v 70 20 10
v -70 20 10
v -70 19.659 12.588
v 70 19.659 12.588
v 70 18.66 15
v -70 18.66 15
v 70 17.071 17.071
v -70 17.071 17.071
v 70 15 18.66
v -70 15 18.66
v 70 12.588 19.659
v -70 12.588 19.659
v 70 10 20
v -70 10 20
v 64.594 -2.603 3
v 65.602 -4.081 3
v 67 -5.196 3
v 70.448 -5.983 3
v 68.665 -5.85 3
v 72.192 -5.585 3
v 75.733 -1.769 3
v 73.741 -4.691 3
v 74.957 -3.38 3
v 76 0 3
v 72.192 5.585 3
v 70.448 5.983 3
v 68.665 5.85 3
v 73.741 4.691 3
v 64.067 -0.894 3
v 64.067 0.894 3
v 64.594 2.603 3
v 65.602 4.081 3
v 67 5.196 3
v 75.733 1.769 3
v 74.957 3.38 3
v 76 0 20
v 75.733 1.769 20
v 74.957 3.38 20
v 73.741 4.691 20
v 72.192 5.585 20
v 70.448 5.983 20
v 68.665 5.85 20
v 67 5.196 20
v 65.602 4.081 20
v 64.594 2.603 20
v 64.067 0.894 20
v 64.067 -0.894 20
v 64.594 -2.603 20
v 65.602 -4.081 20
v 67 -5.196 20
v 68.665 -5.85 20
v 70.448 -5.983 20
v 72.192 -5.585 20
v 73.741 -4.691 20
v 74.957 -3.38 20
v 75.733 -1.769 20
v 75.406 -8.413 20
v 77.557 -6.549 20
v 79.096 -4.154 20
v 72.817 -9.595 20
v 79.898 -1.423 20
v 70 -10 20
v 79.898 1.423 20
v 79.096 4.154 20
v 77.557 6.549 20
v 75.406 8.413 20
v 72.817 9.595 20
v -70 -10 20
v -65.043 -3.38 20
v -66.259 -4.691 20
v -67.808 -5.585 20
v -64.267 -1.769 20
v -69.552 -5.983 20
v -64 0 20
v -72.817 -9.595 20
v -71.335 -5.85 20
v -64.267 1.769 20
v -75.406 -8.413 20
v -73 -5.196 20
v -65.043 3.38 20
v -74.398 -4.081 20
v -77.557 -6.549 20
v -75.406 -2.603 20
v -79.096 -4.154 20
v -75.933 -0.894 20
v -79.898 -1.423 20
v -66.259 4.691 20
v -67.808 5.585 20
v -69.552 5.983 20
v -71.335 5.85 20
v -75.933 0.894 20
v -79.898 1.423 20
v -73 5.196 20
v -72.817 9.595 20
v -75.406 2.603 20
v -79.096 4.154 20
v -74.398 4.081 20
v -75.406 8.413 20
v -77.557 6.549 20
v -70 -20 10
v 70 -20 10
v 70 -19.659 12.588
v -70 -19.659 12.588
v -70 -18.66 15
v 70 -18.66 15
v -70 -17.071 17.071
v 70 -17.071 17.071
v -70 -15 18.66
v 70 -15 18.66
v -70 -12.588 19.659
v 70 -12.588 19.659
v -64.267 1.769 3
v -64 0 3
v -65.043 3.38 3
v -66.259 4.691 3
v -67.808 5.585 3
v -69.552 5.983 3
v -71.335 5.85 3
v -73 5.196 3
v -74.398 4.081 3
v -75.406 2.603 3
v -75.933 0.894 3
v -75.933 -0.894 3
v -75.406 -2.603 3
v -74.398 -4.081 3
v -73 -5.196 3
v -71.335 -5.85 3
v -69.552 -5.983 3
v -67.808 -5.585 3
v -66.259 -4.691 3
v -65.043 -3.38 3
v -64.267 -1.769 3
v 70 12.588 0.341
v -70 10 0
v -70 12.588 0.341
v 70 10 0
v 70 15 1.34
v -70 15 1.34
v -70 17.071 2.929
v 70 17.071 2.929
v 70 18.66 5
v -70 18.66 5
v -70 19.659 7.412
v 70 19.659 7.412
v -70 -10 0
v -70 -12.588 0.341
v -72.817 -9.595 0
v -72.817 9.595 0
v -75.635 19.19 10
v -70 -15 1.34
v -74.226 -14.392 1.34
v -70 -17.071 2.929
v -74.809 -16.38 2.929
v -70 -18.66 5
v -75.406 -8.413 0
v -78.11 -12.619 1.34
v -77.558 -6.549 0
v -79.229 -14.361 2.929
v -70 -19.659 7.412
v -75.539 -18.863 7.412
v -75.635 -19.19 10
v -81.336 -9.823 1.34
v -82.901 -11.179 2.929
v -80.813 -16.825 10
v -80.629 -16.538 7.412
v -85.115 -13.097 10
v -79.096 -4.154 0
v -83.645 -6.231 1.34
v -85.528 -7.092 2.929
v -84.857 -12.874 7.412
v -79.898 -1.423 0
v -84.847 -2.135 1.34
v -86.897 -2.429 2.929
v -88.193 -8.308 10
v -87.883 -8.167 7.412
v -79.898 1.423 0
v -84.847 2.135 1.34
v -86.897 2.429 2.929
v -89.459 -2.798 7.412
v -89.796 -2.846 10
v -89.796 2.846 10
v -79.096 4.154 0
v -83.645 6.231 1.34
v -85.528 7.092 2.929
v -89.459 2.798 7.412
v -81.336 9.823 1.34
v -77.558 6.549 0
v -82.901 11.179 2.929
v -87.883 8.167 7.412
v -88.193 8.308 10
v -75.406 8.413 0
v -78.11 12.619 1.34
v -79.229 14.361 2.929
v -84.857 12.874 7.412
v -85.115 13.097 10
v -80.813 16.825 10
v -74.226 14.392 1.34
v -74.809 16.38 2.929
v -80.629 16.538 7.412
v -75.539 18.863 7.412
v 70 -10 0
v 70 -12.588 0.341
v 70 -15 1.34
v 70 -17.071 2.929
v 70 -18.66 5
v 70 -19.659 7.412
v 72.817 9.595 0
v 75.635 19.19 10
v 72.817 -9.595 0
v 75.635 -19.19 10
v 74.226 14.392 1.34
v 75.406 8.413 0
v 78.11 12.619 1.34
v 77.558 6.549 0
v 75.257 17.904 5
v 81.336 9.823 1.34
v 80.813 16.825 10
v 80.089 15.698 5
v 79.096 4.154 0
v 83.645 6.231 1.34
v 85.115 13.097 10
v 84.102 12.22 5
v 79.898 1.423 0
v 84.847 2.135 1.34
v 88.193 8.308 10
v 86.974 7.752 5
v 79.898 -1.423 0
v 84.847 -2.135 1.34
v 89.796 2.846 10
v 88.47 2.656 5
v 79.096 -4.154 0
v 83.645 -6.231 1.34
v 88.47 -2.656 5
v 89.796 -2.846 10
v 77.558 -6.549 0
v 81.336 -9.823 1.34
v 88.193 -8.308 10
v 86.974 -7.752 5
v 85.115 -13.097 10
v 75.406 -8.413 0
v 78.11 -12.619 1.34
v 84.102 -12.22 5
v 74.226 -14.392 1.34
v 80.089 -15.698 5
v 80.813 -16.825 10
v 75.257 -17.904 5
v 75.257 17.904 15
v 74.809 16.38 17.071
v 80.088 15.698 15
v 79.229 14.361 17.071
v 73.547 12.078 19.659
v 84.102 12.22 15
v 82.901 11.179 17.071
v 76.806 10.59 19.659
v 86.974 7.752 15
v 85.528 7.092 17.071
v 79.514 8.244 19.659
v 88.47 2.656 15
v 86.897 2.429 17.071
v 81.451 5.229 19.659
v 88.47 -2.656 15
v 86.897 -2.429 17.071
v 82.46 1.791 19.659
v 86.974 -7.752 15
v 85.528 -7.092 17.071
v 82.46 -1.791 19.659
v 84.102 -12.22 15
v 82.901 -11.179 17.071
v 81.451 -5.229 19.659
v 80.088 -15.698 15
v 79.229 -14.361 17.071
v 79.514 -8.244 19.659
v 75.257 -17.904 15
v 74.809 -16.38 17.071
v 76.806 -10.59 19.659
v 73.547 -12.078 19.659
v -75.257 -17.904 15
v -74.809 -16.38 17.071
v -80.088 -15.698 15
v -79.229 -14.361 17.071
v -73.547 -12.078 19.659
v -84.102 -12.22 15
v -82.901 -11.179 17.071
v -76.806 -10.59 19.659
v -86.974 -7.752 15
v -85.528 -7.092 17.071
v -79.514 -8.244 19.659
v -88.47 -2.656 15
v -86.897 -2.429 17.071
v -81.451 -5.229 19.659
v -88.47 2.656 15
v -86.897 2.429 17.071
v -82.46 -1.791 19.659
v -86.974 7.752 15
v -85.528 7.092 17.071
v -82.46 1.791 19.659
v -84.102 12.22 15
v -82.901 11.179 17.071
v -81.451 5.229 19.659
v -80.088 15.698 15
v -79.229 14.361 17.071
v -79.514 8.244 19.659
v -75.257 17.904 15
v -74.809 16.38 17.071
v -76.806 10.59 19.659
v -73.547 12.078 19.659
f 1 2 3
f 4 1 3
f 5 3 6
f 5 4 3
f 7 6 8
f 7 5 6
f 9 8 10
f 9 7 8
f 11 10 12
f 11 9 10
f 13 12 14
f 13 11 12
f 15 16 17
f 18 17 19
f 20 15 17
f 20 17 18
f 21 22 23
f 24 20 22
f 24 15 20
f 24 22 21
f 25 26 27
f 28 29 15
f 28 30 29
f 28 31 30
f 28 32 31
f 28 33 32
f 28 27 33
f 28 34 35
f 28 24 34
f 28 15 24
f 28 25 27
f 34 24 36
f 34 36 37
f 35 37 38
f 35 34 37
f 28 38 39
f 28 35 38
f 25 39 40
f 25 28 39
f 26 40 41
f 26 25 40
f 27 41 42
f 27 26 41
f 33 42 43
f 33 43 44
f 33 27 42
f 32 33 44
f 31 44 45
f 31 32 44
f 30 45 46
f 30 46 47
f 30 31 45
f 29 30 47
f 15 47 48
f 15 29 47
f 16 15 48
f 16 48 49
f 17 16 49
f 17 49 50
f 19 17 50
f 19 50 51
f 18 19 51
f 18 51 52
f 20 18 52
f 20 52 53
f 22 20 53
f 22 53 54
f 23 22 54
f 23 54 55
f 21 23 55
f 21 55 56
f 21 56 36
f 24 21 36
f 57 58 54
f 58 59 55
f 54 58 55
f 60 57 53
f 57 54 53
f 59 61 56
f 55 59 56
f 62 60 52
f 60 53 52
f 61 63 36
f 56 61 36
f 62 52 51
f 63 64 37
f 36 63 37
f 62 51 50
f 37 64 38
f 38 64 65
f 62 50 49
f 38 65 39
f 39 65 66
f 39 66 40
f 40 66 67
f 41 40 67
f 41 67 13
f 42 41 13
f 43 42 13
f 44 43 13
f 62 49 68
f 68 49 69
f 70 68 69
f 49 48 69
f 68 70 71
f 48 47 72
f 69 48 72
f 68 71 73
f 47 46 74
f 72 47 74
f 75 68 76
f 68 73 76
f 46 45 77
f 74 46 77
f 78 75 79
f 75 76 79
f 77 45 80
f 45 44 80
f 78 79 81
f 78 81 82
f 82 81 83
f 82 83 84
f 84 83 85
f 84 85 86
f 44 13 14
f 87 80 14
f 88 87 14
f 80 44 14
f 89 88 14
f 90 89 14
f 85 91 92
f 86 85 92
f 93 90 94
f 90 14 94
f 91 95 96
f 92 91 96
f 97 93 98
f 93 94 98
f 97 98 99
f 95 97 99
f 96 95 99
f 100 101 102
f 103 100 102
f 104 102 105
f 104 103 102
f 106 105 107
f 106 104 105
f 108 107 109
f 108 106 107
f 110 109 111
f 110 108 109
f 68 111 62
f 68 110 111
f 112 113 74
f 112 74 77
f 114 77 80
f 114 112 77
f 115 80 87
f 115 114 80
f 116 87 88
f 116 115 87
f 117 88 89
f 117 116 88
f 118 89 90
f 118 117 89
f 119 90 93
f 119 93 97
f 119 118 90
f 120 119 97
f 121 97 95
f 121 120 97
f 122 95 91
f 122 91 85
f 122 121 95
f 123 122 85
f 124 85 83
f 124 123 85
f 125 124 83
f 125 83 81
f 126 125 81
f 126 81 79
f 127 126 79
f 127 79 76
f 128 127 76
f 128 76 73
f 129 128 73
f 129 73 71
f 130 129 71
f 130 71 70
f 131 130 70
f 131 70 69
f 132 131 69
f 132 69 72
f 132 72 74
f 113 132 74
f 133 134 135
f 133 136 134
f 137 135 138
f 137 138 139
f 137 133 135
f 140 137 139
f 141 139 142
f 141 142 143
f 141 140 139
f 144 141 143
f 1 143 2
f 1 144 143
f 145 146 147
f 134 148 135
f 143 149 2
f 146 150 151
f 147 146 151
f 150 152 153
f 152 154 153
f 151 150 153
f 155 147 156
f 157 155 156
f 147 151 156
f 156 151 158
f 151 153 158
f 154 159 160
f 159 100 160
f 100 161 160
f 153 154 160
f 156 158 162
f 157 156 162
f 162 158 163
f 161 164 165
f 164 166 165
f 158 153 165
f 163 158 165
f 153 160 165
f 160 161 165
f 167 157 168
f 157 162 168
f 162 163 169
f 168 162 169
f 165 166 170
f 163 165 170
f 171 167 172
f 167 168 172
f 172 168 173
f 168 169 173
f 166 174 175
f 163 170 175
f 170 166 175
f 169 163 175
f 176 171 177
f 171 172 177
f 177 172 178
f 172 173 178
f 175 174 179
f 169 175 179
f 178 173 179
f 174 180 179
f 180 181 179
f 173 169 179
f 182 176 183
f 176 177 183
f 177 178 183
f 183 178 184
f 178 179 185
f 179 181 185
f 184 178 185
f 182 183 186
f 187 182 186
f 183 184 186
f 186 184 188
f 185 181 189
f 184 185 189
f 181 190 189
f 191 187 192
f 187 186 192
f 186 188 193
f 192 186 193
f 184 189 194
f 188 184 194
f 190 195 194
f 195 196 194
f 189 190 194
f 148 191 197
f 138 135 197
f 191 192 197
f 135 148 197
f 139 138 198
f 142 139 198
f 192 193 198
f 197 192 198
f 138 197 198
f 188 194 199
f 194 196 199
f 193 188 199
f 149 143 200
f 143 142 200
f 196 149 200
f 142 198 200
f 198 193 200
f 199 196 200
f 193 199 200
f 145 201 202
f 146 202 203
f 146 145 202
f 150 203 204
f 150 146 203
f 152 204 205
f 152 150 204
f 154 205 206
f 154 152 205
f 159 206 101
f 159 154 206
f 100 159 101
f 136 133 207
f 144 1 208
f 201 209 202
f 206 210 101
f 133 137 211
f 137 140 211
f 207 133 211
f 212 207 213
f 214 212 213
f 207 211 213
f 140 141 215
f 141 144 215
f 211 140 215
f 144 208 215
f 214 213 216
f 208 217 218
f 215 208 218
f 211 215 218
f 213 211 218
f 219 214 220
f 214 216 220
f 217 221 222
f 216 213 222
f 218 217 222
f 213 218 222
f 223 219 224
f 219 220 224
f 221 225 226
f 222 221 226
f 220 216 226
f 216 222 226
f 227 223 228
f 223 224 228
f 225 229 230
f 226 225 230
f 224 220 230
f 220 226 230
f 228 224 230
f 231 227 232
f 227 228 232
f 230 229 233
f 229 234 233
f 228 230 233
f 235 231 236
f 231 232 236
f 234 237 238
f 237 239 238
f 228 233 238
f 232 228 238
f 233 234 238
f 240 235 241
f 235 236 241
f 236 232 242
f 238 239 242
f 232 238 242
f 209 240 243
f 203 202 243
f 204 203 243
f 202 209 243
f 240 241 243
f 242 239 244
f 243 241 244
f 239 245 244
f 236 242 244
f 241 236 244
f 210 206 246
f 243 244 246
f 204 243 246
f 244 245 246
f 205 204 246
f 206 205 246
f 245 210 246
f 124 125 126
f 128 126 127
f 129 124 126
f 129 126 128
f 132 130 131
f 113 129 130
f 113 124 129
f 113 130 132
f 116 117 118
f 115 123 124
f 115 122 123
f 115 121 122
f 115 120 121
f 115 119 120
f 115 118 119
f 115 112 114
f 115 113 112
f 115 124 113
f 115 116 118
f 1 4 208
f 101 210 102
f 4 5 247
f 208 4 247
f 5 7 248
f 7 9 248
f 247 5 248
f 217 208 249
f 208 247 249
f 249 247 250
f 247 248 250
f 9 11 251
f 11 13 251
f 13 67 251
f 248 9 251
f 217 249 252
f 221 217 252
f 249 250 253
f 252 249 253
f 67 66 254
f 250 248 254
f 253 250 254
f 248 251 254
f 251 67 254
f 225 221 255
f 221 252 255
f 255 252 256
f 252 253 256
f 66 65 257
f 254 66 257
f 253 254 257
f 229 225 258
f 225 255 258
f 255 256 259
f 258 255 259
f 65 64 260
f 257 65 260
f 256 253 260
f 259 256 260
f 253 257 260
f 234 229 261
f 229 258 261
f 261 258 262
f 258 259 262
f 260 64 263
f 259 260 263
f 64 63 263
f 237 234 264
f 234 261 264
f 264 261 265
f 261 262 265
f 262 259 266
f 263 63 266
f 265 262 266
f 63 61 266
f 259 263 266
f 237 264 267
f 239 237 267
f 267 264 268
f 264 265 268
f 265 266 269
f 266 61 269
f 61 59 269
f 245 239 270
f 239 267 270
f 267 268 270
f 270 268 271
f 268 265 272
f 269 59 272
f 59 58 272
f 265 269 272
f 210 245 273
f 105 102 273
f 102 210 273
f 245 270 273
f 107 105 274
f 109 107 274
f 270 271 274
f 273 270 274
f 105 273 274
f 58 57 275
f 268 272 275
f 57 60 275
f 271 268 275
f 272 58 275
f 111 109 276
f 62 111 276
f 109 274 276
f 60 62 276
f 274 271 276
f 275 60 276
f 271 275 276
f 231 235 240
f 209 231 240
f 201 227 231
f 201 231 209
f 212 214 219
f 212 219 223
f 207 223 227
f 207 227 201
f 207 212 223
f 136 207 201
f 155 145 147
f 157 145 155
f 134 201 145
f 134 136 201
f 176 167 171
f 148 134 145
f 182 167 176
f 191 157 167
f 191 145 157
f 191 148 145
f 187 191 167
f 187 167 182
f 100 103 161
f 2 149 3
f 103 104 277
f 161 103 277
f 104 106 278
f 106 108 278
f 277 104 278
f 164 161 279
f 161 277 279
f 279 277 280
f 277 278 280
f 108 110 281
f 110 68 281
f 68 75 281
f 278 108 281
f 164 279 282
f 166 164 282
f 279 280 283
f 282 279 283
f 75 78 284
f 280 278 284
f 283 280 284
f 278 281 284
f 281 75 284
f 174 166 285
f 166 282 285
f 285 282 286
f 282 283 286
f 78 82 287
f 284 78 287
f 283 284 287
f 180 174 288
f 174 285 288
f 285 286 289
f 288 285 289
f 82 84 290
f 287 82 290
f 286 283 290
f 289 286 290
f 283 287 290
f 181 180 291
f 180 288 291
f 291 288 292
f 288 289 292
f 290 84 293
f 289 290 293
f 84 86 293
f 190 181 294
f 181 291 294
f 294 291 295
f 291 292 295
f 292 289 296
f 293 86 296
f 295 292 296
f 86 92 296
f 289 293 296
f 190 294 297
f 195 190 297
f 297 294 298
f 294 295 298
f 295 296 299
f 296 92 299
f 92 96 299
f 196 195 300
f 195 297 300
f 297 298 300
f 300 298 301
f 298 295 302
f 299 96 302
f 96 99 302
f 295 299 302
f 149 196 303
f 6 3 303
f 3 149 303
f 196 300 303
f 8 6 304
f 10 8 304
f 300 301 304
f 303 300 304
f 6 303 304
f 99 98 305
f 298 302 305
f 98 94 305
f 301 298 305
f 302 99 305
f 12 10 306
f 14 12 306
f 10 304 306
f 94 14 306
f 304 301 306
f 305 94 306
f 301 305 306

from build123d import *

# Parameters (mm, degrees)
SKETCH1_R           = 6
BOSS_EXTRUDE2_DEPTH = 20
SKETCH3_R           = 10
BOSS_EXTRUDE3_DEPTH = 3
FILLET1_R           = 10
FILLET2_R           = 10


with BuildPart() as part:
    # Sketch1 → Boss-Extrude2 (new body)
    with BuildSketch(Plane.XY):
        with BuildLine():
            Line((-70, 20), (70, 20))
            ThreePointArc((70, 20), (90, 0), (70, -20))
            Line((70, -20), (-70, -20))
            ThreePointArc((-70, -20), (-90, 0), (-70, 20))
        make_face()
        with Locations((-70, 0)):
            Circle(SKETCH1_R, mode=Mode.SUBTRACT)
        with Locations((70, 0)):
            Circle(SKETCH1_R, mode=Mode.SUBTRACT)
    extrude(amount=BOSS_EXTRUDE2_DEPTH)

    # Sketch3 → Boss-Extrude3 (add)
    with BuildSketch(Plane.XY):
        with Locations((-70, 0)):
            Circle(SKETCH3_R)
        with Locations((70, 0)):
            Circle(SKETCH3_R)
    extrude(amount=BOSS_EXTRUDE3_DEPTH)

    # Fillet1
    fillet1_edges = [part.edges().sort_by_distance(p)[0] for p in [
        (90, 0, 20),
        (0, 20, 20),
        (-90, 0, 20),
        (0, -20, 20),
    ]]
    fillet(fillet1_edges, radius=FILLET1_R)

    # Fillet2
    fillet2_edges = [part.edges().sort_by_distance(p)[0] for p in [
        (90, 0, 0),
        (0, -20, 0),
        (-90, 0, 0),
        (0, 20, 0),
    ]]
    fillet(fillet2_edges, radius=FILLET2_R - 0.0001)  # a hair under: the kernel refuses the full size


solid = part.part
